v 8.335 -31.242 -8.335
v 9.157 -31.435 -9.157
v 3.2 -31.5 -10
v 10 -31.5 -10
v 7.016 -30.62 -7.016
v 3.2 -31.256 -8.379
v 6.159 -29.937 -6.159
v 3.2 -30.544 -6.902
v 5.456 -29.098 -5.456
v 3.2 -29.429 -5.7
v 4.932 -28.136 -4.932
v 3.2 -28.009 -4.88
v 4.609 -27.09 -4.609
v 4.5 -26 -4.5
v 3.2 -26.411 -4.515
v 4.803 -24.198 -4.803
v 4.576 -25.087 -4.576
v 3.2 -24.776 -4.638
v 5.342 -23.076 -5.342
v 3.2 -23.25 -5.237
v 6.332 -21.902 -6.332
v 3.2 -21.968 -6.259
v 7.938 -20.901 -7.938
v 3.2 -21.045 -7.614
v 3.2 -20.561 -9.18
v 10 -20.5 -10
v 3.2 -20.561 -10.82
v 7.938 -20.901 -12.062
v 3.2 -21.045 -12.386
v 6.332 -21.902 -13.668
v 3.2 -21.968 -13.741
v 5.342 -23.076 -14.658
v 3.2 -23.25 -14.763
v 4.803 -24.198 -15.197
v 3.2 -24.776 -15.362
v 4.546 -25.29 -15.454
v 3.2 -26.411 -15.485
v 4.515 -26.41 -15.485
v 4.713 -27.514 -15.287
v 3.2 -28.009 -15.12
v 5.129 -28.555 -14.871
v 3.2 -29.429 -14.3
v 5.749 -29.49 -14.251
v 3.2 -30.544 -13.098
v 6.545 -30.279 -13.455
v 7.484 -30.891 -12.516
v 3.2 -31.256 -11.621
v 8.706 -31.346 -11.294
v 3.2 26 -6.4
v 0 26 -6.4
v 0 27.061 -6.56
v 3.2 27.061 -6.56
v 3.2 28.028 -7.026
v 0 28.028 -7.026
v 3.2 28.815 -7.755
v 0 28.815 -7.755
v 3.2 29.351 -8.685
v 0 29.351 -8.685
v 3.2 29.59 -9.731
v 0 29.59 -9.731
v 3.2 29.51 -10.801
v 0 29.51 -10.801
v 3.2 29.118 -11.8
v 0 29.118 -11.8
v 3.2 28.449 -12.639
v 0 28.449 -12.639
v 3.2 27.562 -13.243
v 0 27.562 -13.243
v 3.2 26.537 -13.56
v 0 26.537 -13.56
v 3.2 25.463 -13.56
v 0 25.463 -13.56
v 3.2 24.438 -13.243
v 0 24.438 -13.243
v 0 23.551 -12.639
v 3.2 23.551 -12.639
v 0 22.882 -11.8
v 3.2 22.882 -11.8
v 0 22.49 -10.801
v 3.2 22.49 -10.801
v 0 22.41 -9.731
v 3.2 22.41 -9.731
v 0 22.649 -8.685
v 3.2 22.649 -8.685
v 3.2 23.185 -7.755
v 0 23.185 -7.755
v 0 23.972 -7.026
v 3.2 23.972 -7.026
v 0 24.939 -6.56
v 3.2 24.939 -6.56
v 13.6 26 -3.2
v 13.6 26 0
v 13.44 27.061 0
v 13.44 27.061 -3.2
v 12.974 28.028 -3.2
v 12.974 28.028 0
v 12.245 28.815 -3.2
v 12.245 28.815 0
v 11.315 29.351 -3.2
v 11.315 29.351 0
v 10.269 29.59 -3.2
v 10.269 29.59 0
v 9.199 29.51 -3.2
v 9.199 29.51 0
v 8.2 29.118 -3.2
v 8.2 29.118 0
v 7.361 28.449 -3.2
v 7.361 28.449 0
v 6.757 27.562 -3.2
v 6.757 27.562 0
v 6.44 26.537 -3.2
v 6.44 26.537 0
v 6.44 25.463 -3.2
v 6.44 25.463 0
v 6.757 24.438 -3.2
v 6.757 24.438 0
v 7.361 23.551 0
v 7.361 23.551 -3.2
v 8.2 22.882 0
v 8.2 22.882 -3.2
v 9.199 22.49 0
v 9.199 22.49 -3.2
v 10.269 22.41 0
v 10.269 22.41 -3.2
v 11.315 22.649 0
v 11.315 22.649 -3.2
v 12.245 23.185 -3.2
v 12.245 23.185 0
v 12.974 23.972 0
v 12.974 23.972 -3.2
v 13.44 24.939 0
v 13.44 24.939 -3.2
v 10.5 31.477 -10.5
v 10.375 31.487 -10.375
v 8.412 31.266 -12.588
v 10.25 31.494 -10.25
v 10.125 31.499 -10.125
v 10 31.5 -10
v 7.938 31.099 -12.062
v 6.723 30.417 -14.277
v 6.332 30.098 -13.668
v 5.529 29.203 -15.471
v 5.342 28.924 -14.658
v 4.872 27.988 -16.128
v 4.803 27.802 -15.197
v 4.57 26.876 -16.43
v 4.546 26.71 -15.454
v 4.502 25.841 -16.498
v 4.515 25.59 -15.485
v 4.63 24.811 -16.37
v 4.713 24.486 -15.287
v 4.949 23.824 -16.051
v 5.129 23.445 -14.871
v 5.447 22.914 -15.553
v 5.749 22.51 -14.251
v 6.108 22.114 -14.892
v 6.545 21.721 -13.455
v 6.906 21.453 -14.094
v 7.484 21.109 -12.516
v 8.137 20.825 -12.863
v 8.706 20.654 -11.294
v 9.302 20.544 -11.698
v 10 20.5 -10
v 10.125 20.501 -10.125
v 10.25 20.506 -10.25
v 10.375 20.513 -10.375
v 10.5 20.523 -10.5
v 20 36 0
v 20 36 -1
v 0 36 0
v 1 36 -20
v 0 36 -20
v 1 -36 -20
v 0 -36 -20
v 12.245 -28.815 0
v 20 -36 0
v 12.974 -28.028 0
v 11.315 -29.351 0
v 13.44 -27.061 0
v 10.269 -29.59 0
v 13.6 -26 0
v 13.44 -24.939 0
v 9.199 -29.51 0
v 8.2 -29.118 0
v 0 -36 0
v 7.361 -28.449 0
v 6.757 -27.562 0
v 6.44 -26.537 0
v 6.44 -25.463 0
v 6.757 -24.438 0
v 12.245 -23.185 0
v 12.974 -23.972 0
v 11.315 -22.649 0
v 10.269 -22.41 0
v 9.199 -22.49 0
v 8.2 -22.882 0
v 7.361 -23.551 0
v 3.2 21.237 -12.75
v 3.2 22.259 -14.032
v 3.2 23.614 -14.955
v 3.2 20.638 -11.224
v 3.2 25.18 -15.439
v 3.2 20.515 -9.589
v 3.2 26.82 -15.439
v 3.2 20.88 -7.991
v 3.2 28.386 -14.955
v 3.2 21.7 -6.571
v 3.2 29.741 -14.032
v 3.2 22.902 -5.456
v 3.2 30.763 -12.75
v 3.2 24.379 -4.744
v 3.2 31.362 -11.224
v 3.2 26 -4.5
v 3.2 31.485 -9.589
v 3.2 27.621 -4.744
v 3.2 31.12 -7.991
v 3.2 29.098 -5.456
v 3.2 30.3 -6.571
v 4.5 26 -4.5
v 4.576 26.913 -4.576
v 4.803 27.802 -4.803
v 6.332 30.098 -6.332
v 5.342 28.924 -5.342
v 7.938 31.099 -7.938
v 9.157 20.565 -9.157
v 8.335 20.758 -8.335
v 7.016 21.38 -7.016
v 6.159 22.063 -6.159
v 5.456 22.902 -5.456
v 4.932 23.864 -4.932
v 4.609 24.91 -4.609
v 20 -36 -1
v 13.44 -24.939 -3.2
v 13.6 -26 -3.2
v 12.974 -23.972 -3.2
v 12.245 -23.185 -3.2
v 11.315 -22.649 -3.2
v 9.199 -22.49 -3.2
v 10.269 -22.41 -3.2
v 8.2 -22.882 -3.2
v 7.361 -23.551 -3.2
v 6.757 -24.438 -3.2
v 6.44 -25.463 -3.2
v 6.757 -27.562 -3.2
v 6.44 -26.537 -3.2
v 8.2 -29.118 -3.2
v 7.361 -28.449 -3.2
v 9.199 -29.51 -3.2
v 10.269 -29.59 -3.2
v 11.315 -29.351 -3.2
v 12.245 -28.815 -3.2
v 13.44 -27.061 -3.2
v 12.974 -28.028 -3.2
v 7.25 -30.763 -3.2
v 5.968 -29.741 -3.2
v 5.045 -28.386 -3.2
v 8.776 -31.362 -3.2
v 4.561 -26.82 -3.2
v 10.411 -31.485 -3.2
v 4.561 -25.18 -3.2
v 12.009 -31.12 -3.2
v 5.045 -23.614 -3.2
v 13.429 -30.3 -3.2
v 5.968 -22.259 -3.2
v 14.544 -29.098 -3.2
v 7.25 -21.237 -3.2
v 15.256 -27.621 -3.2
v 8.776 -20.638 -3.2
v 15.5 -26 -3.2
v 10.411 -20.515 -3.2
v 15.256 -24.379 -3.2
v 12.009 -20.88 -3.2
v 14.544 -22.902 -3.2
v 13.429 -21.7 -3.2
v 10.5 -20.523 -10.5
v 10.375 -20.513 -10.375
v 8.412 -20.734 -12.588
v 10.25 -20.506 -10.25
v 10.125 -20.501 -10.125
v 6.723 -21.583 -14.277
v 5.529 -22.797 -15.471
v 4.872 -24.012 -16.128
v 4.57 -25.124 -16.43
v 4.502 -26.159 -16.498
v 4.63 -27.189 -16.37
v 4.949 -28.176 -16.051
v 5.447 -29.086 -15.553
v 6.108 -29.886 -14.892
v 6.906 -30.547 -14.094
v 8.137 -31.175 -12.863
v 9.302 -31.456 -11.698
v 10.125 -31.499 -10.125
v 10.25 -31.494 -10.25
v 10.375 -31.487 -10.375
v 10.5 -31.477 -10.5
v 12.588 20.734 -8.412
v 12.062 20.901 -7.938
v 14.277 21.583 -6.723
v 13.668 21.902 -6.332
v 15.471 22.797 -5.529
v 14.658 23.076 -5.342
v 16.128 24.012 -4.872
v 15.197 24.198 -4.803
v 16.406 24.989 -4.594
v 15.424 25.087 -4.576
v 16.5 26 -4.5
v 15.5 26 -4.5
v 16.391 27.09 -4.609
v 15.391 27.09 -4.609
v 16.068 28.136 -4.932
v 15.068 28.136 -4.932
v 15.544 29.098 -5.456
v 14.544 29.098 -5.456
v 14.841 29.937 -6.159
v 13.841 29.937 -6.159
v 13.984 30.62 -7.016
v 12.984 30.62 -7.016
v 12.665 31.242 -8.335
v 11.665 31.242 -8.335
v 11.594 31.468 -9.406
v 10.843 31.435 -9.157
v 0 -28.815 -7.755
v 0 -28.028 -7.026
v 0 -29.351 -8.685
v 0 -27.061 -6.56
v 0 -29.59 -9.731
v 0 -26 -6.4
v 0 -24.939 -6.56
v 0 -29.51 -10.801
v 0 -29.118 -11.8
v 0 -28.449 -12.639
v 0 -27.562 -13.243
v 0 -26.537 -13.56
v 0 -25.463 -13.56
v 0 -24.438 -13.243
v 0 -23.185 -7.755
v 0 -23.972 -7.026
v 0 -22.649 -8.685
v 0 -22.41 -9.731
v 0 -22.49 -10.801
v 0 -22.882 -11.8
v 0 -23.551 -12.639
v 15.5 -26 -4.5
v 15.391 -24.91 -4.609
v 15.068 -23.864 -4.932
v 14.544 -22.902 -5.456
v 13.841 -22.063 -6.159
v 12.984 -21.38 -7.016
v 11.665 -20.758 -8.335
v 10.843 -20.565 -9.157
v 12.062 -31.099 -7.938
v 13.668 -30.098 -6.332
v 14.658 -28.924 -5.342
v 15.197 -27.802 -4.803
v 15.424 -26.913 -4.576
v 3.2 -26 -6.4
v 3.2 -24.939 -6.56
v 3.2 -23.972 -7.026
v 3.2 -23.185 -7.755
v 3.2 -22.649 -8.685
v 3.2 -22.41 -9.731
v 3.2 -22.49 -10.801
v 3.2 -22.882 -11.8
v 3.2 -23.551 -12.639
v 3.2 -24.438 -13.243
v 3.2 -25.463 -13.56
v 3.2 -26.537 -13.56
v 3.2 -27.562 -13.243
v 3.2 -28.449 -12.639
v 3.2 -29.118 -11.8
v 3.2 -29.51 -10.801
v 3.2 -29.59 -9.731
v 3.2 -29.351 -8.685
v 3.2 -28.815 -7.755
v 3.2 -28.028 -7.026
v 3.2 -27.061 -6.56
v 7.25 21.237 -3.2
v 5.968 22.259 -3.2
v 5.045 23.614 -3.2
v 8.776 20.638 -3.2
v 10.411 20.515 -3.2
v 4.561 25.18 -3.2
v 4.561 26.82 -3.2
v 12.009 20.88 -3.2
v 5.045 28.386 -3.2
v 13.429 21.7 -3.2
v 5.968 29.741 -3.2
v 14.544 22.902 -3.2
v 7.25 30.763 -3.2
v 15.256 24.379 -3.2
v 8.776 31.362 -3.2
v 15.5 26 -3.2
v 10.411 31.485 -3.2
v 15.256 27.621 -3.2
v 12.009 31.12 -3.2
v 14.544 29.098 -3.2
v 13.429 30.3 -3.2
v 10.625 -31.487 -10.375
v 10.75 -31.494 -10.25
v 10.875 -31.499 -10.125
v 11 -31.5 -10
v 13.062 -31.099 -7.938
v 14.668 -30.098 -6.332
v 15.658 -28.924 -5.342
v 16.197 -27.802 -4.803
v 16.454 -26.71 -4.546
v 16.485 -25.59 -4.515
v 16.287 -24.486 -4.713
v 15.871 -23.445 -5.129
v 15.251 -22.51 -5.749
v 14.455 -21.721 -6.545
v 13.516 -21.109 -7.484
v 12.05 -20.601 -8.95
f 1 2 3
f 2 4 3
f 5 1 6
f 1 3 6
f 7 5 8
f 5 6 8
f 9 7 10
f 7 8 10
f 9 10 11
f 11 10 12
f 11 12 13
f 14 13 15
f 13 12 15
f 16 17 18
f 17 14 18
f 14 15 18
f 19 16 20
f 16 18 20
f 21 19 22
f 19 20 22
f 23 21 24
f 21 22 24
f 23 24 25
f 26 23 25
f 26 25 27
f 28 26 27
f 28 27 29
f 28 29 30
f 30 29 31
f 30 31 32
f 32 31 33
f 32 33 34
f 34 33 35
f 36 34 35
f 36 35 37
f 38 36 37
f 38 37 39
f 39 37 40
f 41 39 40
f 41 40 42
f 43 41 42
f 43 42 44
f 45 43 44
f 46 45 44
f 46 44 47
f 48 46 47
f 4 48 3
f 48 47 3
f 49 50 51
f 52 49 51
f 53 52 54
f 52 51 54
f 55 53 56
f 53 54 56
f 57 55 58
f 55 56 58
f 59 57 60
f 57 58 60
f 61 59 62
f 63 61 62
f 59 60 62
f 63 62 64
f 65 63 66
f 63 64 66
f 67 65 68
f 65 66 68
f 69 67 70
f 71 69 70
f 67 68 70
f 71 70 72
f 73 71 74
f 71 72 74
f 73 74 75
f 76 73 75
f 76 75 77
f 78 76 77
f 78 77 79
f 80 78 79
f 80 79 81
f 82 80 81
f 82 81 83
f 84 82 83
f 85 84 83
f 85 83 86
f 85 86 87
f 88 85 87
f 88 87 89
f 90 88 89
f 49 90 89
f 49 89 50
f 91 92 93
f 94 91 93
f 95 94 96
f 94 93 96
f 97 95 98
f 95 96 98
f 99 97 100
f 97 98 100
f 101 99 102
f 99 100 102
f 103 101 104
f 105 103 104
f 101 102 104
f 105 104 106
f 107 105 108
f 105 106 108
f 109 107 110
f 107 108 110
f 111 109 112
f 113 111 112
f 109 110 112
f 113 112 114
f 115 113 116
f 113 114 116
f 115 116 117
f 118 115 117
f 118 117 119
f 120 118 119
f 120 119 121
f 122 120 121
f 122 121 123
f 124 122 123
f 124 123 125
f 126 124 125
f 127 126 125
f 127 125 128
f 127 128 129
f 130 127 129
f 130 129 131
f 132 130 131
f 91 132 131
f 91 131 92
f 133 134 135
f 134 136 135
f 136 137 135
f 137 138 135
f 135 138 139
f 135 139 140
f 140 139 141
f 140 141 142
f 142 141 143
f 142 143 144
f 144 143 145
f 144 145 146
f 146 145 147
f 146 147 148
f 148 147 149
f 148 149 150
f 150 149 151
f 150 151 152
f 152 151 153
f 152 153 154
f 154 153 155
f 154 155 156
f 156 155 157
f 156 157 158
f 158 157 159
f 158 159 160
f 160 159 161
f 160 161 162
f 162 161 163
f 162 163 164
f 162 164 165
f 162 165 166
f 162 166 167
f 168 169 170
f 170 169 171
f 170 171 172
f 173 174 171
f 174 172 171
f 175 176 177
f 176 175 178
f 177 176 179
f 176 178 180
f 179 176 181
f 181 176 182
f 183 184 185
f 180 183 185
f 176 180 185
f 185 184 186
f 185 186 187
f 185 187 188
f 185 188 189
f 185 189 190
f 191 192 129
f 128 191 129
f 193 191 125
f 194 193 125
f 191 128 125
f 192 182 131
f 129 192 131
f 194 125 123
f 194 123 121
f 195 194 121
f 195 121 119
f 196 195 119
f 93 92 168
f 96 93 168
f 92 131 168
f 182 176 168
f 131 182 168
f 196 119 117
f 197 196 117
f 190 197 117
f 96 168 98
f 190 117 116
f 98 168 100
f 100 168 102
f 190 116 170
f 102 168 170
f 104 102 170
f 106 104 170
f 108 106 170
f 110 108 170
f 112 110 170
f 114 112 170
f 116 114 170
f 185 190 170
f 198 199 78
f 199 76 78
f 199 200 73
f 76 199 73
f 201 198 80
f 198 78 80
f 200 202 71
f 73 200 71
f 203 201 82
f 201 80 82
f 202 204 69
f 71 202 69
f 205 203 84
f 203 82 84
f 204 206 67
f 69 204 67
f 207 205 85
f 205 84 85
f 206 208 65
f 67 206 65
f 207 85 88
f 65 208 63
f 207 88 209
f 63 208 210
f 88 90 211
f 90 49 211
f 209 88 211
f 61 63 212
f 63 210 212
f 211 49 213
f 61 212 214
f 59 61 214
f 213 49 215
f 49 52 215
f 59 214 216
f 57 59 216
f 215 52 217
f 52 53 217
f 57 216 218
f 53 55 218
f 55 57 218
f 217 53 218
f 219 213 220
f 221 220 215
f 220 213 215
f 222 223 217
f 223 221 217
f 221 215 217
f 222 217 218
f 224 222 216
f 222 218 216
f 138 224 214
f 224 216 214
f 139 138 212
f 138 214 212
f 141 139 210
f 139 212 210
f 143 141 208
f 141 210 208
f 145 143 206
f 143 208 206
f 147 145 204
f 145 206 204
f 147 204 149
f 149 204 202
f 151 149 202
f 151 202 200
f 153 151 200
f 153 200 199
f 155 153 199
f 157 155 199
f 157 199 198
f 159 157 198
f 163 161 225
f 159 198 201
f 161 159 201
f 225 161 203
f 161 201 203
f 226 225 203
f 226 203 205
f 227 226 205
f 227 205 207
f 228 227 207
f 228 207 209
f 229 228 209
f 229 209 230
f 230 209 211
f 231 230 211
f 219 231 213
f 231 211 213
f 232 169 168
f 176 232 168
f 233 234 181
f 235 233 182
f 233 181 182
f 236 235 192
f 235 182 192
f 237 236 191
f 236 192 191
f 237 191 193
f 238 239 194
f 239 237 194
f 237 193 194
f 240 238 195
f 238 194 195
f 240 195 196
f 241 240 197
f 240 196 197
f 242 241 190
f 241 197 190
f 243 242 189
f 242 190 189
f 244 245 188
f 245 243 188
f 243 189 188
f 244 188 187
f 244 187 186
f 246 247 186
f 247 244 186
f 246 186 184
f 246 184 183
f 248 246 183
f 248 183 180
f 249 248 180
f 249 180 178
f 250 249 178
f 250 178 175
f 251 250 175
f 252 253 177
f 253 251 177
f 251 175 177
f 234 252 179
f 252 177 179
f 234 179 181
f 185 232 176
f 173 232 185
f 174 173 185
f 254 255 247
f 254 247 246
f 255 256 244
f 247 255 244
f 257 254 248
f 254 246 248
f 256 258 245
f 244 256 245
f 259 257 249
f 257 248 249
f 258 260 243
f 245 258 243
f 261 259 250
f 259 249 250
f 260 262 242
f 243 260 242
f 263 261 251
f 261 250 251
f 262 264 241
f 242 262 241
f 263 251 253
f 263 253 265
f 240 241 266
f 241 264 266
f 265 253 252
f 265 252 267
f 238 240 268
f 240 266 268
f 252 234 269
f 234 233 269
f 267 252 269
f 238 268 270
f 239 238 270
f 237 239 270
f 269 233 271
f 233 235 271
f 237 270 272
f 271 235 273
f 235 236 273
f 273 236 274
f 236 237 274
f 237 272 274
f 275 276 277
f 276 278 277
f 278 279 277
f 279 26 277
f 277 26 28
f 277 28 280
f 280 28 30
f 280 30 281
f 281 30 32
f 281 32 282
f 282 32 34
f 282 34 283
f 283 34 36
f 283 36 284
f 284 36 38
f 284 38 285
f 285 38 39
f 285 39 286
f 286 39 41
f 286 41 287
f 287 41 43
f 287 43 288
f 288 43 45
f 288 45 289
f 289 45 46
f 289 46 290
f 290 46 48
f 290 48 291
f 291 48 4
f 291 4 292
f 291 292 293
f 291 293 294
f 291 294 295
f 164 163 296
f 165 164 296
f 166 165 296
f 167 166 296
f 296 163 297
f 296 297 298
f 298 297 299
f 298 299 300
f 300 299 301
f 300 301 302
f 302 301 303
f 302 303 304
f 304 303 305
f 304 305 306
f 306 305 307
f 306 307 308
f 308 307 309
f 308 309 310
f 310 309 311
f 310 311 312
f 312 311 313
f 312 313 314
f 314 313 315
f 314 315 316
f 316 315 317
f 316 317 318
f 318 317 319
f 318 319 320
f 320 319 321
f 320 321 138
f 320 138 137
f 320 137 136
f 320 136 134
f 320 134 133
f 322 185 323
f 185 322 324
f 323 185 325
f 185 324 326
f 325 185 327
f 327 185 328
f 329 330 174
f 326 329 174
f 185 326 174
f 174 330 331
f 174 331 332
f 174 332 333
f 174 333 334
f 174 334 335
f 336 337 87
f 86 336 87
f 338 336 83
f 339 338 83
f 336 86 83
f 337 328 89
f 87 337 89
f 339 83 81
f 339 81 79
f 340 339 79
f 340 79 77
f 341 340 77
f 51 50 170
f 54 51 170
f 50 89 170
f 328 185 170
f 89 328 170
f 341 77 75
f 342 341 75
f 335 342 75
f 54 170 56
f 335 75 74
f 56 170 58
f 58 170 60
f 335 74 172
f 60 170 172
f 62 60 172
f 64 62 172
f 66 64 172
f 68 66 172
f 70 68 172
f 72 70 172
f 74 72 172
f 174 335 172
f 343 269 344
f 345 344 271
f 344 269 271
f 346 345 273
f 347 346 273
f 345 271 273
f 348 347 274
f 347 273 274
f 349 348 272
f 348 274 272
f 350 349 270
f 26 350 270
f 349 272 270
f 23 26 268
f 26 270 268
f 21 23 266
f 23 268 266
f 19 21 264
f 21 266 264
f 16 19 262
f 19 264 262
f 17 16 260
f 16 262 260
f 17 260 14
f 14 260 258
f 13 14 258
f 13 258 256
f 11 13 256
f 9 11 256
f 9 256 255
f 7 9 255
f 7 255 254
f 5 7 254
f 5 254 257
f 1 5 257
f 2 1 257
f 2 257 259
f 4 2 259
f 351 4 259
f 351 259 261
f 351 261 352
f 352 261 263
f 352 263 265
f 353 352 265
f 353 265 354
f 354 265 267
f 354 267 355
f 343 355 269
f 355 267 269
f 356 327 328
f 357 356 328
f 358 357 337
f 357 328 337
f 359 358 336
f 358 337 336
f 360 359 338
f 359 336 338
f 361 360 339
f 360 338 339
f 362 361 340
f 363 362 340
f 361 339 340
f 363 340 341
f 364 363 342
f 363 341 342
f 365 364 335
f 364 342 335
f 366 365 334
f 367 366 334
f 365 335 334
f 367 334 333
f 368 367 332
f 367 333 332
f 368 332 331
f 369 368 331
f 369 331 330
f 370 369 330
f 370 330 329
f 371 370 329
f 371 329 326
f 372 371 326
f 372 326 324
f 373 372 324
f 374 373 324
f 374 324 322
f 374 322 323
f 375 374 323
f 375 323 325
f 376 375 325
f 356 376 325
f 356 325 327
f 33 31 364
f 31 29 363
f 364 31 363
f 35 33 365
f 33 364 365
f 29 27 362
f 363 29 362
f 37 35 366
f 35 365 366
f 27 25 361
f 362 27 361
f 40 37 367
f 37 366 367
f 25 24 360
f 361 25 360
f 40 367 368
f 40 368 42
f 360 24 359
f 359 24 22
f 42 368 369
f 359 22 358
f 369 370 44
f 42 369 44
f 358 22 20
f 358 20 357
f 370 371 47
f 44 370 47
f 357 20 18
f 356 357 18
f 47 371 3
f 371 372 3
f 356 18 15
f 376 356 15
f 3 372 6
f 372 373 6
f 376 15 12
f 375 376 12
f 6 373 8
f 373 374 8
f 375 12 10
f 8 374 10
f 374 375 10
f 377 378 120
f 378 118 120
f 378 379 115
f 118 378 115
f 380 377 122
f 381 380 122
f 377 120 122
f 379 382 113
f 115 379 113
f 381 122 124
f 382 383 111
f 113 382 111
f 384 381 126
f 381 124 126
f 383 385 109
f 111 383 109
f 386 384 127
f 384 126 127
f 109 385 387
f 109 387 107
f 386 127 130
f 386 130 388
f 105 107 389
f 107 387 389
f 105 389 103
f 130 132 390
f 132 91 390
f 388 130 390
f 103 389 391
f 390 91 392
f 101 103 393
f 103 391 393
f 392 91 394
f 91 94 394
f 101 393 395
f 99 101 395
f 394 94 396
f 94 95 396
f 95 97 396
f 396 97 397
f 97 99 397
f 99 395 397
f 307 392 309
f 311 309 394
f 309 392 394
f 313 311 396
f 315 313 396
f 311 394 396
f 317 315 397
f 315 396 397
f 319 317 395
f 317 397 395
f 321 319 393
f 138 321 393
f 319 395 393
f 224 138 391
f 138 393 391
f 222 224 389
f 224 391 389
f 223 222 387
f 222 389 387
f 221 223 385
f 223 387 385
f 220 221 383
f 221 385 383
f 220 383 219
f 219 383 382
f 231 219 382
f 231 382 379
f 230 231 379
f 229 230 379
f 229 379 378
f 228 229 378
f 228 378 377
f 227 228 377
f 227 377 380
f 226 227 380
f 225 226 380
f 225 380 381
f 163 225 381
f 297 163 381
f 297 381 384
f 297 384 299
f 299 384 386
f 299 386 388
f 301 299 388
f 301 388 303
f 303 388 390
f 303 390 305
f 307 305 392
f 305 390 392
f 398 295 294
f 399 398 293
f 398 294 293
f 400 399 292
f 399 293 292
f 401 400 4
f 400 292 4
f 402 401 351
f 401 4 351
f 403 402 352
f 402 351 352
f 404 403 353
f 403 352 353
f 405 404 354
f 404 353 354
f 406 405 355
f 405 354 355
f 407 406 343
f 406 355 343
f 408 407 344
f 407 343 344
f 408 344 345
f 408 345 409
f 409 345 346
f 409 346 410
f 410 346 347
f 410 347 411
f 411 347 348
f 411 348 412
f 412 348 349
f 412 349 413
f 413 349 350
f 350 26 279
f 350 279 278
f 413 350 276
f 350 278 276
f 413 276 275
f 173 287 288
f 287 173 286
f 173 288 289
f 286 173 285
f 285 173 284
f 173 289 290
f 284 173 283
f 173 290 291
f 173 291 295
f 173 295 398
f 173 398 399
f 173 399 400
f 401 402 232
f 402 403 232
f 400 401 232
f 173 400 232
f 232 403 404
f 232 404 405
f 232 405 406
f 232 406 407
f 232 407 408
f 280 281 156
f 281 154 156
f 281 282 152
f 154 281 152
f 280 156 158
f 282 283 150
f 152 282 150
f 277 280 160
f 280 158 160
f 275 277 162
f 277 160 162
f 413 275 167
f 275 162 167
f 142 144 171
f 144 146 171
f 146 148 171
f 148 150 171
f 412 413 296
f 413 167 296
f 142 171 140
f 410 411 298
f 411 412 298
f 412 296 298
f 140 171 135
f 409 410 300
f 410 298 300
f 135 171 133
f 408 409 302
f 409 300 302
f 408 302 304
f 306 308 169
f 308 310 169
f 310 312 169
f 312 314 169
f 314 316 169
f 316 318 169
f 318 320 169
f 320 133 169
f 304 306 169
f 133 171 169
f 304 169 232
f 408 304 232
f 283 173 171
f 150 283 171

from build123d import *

# Parameters (mm, degrees)
BOSS_EXTRUDE1_DEPTH = 36
CUT_EXTRUDE1_REACH  = 47.782
SKETCH3_R           = 3.6
CUT_EXTRUDE3_REACH  = 50.982
CUT_EXTRUDE3_START  = -3.2
SKETCH3_4_R         = 5.5
SKETCH3_4_R_2       = 3.6
CUT_EXTRUDE2_REACH  = 47.782
SKETCH4_R           = 3.6
CUT_EXTRUDE4_REACH  = 50.982
CUT_EXTRUDE4_START  = -3.2
SKETCH4_3_R         = 5.5
SKETCH4_3_R_2       = 3.6


with BuildPart() as part:
    # Sketch2 → Boss-Extrude1 (new, symmetric)
    with BuildSketch(Plane(origin=(0, 0, 0), x_dir=(1, 0, 0), z_dir=(0, 1, 0))):
        Polygon((0, 0), (0, 20), (1, 20), (20, 1), (20, 0), align=None)
    extrude(amount=BOSS_EXTRUDE1_DEPTH, both=True)

    # Cut-Extrude1: up to this plane
    cut_extrude1_end = Plane(origin=(1, 36, -20), z_dir=(-0.7071067811865476, 0, 0.7071067811865476))
    # Sketch3 → Cut-Extrude1 (cut, up to the surface)
    with BuildSketch(Plane.XY, mode=Mode.PRIVATE) as cut_extrude1_sk1:
        with Locations((10, 26)):
            Circle(SKETCH3_R)
    cut_extrude1_tool1 = split(extrude(cut_extrude1_sk1.sketch, amount=-CUT_EXTRUDE1_REACH, mode=Mode.PRIVATE), bisect_by=cut_extrude1_end, keep=Keep.BOTH, mode=Mode.PRIVATE)
    add(cut_extrude1_tool1.solids().sort_by_distance((10, 26, 0))[0], mode=Mode.SUBTRACT)
    # Sketch3 → Cut-Extrude1 (cut, up to the surface)
    with BuildSketch(Plane.XY, mode=Mode.PRIVATE) as cut_extrude1_sk2:
        with Locations((10, -26)):
            Circle(SKETCH3_R)
    cut_extrude1_tool2 = split(extrude(cut_extrude1_sk2.sketch, amount=-CUT_EXTRUDE1_REACH, mode=Mode.PRIVATE), bisect_by=cut_extrude1_end, keep=Keep.BOTH, mode=Mode.PRIVATE)
    add(cut_extrude1_tool2.solids().sort_by_distance((10, -26, 0))[0], mode=Mode.SUBTRACT)

    # Cut-Extrude3: up to this plane
    cut_extrude3_end = Plane(origin=(1, 36, -20), z_dir=(-0.7071067811865476, 0, 0.7071067811865476))
    # Sketch3<4> → Cut-Extrude3 (cut, up to the surface)
    with BuildSketch(Plane.XY.offset(CUT_EXTRUDE3_START), mode=Mode.PRIVATE) as cut_extrude3_sk1:
        with Locations((10, 26)):
            Circle(SKETCH3_4_R)
        with Locations((10, 26)):
            Circle(SKETCH3_4_R_2, mode=Mode.SUBTRACT)
    cut_extrude3_tool1 = split(extrude(cut_extrude3_sk1.sketch, amount=-CUT_EXTRUDE3_REACH, mode=Mode.PRIVATE), bisect_by=cut_extrude3_end, keep=Keep.BOTH, mode=Mode.PRIVATE)
    add(cut_extrude3_tool1.solids().sort_by_distance((4.655563, 26, -3.2))[0], mode=Mode.SUBTRACT)
    # Sketch3<4> → Cut-Extrude3 (cut, up to the surface)
    with BuildSketch(Plane.XY.offset(CUT_EXTRUDE3_START), mode=Mode.PRIVATE) as cut_extrude3_sk2:
        with Locations((10, -26)):
            Circle(SKETCH3_4_R)
        with Locations(Location((10, -26, 0), (0, 0, 180))):
            Circle(SKETCH3_4_R_2, mode=Mode.SUBTRACT)
    cut_extrude3_tool2 = split(extrude(cut_extrude3_sk2.sketch, amount=-CUT_EXTRUDE3_REACH, mode=Mode.PRIVATE), bisect_by=cut_extrude3_end, keep=Keep.BOTH, mode=Mode.PRIVATE)
    add(cut_extrude3_tool2.solids().sort_by_distance((4.655563, -26, -3.2))[0], mode=Mode.SUBTRACT)

    # Cut-Extrude2: up to this face of the body (flat: up to its plane)
    cut_extrude2_end = Plane(part.part.faces().sort_by_distance((10.58067787, 0, -10.41932213))[0])
    # Sketch4 → Cut-Extrude2 (cut, up to the picked face)
    with BuildSketch(Plane.ZY, mode=Mode.PRIVATE) as cut_extrude2_sk1:
        with Locations((-10, 26)):
            Circle(SKETCH4_R)
    cut_extrude2_tool1 = split(extrude(cut_extrude2_sk1.sketch, amount=-CUT_EXTRUDE2_REACH, mode=Mode.PRIVATE), bisect_by=cut_extrude2_end, keep=Keep.BOTH, mode=Mode.PRIVATE)
    # Sketch4 → Cut-Extrude2 (cut, up to the picked face)
    with BuildSketch(Plane.ZY, mode=Mode.PRIVATE) as cut_extrude2_sk2:
        with Locations((-10, -26)):
            Circle(SKETCH4_R)
    cut_extrude2_tool2 = split(extrude(cut_extrude2_sk2.sketch, amount=-CUT_EXTRUDE2_REACH, mode=Mode.PRIVATE), bisect_by=cut_extrude2_end, keep=Keep.BOTH, mode=Mode.PRIVATE)
    add(cut_extrude2_tool1.solids().sort_by(Axis((0, 26, -10), (1, 0, 0)))[0], mode=Mode.SUBTRACT)
    add(cut_extrude2_tool2.solids().sort_by(Axis((0, -26, -10), (1, 0, 0)))[0], mode=Mode.SUBTRACT)

    # Cut-Extrude4: up to this plane
    cut_extrude4_end = Plane(origin=(1, 36, -20), z_dir=(-0.7071067811865476, 0, 0.7071067811865476))
    # Sketch4<3> → Cut-Extrude4 (cut, up to the surface)
    with BuildSketch(Plane.ZY.offset(CUT_EXTRUDE4_START), mode=Mode.PRIVATE) as cut_extrude4_sk1:
        with Locations((-10, 26)):
            Circle(SKETCH4_3_R)
        with Locations((-10, 26)):
            Circle(SKETCH4_3_R_2, mode=Mode.SUBTRACT)
    cut_extrude4_tool1 = split(extrude(cut_extrude4_sk1.sketch, amount=-CUT_EXTRUDE4_REACH, mode=Mode.PRIVATE), bisect_by=cut_extrude4_end, keep=Keep.BOTH, mode=Mode.PRIVATE)
    add(cut_extrude4_tool1.solids().sort_by_distance((3.2, 26, -15.344437))[0], mode=Mode.SUBTRACT)
    # Sketch4<3> → Cut-Extrude4 (cut, up to the surface)
    with BuildSketch(Plane.ZY.offset(CUT_EXTRUDE4_START), mode=Mode.PRIVATE) as cut_extrude4_sk2:
        with Locations(Location((-10, -26, 0), (0, 0, 270))):
            Circle(SKETCH4_3_R)
        with Locations((-10, -26)):
            Circle(SKETCH4_3_R_2, mode=Mode.SUBTRACT)
    cut_extrude4_tool2 = split(extrude(cut_extrude4_sk2.sketch, amount=-CUT_EXTRUDE4_REACH, mode=Mode.PRIVATE), bisect_by=cut_extrude4_end, keep=Keep.BOTH, mode=Mode.PRIVATE)
    add(cut_extrude4_tool2.solids().sort_by_distance((3.2, -20.655563, -10))[0], mode=Mode.SUBTRACT)


solid = part.part
